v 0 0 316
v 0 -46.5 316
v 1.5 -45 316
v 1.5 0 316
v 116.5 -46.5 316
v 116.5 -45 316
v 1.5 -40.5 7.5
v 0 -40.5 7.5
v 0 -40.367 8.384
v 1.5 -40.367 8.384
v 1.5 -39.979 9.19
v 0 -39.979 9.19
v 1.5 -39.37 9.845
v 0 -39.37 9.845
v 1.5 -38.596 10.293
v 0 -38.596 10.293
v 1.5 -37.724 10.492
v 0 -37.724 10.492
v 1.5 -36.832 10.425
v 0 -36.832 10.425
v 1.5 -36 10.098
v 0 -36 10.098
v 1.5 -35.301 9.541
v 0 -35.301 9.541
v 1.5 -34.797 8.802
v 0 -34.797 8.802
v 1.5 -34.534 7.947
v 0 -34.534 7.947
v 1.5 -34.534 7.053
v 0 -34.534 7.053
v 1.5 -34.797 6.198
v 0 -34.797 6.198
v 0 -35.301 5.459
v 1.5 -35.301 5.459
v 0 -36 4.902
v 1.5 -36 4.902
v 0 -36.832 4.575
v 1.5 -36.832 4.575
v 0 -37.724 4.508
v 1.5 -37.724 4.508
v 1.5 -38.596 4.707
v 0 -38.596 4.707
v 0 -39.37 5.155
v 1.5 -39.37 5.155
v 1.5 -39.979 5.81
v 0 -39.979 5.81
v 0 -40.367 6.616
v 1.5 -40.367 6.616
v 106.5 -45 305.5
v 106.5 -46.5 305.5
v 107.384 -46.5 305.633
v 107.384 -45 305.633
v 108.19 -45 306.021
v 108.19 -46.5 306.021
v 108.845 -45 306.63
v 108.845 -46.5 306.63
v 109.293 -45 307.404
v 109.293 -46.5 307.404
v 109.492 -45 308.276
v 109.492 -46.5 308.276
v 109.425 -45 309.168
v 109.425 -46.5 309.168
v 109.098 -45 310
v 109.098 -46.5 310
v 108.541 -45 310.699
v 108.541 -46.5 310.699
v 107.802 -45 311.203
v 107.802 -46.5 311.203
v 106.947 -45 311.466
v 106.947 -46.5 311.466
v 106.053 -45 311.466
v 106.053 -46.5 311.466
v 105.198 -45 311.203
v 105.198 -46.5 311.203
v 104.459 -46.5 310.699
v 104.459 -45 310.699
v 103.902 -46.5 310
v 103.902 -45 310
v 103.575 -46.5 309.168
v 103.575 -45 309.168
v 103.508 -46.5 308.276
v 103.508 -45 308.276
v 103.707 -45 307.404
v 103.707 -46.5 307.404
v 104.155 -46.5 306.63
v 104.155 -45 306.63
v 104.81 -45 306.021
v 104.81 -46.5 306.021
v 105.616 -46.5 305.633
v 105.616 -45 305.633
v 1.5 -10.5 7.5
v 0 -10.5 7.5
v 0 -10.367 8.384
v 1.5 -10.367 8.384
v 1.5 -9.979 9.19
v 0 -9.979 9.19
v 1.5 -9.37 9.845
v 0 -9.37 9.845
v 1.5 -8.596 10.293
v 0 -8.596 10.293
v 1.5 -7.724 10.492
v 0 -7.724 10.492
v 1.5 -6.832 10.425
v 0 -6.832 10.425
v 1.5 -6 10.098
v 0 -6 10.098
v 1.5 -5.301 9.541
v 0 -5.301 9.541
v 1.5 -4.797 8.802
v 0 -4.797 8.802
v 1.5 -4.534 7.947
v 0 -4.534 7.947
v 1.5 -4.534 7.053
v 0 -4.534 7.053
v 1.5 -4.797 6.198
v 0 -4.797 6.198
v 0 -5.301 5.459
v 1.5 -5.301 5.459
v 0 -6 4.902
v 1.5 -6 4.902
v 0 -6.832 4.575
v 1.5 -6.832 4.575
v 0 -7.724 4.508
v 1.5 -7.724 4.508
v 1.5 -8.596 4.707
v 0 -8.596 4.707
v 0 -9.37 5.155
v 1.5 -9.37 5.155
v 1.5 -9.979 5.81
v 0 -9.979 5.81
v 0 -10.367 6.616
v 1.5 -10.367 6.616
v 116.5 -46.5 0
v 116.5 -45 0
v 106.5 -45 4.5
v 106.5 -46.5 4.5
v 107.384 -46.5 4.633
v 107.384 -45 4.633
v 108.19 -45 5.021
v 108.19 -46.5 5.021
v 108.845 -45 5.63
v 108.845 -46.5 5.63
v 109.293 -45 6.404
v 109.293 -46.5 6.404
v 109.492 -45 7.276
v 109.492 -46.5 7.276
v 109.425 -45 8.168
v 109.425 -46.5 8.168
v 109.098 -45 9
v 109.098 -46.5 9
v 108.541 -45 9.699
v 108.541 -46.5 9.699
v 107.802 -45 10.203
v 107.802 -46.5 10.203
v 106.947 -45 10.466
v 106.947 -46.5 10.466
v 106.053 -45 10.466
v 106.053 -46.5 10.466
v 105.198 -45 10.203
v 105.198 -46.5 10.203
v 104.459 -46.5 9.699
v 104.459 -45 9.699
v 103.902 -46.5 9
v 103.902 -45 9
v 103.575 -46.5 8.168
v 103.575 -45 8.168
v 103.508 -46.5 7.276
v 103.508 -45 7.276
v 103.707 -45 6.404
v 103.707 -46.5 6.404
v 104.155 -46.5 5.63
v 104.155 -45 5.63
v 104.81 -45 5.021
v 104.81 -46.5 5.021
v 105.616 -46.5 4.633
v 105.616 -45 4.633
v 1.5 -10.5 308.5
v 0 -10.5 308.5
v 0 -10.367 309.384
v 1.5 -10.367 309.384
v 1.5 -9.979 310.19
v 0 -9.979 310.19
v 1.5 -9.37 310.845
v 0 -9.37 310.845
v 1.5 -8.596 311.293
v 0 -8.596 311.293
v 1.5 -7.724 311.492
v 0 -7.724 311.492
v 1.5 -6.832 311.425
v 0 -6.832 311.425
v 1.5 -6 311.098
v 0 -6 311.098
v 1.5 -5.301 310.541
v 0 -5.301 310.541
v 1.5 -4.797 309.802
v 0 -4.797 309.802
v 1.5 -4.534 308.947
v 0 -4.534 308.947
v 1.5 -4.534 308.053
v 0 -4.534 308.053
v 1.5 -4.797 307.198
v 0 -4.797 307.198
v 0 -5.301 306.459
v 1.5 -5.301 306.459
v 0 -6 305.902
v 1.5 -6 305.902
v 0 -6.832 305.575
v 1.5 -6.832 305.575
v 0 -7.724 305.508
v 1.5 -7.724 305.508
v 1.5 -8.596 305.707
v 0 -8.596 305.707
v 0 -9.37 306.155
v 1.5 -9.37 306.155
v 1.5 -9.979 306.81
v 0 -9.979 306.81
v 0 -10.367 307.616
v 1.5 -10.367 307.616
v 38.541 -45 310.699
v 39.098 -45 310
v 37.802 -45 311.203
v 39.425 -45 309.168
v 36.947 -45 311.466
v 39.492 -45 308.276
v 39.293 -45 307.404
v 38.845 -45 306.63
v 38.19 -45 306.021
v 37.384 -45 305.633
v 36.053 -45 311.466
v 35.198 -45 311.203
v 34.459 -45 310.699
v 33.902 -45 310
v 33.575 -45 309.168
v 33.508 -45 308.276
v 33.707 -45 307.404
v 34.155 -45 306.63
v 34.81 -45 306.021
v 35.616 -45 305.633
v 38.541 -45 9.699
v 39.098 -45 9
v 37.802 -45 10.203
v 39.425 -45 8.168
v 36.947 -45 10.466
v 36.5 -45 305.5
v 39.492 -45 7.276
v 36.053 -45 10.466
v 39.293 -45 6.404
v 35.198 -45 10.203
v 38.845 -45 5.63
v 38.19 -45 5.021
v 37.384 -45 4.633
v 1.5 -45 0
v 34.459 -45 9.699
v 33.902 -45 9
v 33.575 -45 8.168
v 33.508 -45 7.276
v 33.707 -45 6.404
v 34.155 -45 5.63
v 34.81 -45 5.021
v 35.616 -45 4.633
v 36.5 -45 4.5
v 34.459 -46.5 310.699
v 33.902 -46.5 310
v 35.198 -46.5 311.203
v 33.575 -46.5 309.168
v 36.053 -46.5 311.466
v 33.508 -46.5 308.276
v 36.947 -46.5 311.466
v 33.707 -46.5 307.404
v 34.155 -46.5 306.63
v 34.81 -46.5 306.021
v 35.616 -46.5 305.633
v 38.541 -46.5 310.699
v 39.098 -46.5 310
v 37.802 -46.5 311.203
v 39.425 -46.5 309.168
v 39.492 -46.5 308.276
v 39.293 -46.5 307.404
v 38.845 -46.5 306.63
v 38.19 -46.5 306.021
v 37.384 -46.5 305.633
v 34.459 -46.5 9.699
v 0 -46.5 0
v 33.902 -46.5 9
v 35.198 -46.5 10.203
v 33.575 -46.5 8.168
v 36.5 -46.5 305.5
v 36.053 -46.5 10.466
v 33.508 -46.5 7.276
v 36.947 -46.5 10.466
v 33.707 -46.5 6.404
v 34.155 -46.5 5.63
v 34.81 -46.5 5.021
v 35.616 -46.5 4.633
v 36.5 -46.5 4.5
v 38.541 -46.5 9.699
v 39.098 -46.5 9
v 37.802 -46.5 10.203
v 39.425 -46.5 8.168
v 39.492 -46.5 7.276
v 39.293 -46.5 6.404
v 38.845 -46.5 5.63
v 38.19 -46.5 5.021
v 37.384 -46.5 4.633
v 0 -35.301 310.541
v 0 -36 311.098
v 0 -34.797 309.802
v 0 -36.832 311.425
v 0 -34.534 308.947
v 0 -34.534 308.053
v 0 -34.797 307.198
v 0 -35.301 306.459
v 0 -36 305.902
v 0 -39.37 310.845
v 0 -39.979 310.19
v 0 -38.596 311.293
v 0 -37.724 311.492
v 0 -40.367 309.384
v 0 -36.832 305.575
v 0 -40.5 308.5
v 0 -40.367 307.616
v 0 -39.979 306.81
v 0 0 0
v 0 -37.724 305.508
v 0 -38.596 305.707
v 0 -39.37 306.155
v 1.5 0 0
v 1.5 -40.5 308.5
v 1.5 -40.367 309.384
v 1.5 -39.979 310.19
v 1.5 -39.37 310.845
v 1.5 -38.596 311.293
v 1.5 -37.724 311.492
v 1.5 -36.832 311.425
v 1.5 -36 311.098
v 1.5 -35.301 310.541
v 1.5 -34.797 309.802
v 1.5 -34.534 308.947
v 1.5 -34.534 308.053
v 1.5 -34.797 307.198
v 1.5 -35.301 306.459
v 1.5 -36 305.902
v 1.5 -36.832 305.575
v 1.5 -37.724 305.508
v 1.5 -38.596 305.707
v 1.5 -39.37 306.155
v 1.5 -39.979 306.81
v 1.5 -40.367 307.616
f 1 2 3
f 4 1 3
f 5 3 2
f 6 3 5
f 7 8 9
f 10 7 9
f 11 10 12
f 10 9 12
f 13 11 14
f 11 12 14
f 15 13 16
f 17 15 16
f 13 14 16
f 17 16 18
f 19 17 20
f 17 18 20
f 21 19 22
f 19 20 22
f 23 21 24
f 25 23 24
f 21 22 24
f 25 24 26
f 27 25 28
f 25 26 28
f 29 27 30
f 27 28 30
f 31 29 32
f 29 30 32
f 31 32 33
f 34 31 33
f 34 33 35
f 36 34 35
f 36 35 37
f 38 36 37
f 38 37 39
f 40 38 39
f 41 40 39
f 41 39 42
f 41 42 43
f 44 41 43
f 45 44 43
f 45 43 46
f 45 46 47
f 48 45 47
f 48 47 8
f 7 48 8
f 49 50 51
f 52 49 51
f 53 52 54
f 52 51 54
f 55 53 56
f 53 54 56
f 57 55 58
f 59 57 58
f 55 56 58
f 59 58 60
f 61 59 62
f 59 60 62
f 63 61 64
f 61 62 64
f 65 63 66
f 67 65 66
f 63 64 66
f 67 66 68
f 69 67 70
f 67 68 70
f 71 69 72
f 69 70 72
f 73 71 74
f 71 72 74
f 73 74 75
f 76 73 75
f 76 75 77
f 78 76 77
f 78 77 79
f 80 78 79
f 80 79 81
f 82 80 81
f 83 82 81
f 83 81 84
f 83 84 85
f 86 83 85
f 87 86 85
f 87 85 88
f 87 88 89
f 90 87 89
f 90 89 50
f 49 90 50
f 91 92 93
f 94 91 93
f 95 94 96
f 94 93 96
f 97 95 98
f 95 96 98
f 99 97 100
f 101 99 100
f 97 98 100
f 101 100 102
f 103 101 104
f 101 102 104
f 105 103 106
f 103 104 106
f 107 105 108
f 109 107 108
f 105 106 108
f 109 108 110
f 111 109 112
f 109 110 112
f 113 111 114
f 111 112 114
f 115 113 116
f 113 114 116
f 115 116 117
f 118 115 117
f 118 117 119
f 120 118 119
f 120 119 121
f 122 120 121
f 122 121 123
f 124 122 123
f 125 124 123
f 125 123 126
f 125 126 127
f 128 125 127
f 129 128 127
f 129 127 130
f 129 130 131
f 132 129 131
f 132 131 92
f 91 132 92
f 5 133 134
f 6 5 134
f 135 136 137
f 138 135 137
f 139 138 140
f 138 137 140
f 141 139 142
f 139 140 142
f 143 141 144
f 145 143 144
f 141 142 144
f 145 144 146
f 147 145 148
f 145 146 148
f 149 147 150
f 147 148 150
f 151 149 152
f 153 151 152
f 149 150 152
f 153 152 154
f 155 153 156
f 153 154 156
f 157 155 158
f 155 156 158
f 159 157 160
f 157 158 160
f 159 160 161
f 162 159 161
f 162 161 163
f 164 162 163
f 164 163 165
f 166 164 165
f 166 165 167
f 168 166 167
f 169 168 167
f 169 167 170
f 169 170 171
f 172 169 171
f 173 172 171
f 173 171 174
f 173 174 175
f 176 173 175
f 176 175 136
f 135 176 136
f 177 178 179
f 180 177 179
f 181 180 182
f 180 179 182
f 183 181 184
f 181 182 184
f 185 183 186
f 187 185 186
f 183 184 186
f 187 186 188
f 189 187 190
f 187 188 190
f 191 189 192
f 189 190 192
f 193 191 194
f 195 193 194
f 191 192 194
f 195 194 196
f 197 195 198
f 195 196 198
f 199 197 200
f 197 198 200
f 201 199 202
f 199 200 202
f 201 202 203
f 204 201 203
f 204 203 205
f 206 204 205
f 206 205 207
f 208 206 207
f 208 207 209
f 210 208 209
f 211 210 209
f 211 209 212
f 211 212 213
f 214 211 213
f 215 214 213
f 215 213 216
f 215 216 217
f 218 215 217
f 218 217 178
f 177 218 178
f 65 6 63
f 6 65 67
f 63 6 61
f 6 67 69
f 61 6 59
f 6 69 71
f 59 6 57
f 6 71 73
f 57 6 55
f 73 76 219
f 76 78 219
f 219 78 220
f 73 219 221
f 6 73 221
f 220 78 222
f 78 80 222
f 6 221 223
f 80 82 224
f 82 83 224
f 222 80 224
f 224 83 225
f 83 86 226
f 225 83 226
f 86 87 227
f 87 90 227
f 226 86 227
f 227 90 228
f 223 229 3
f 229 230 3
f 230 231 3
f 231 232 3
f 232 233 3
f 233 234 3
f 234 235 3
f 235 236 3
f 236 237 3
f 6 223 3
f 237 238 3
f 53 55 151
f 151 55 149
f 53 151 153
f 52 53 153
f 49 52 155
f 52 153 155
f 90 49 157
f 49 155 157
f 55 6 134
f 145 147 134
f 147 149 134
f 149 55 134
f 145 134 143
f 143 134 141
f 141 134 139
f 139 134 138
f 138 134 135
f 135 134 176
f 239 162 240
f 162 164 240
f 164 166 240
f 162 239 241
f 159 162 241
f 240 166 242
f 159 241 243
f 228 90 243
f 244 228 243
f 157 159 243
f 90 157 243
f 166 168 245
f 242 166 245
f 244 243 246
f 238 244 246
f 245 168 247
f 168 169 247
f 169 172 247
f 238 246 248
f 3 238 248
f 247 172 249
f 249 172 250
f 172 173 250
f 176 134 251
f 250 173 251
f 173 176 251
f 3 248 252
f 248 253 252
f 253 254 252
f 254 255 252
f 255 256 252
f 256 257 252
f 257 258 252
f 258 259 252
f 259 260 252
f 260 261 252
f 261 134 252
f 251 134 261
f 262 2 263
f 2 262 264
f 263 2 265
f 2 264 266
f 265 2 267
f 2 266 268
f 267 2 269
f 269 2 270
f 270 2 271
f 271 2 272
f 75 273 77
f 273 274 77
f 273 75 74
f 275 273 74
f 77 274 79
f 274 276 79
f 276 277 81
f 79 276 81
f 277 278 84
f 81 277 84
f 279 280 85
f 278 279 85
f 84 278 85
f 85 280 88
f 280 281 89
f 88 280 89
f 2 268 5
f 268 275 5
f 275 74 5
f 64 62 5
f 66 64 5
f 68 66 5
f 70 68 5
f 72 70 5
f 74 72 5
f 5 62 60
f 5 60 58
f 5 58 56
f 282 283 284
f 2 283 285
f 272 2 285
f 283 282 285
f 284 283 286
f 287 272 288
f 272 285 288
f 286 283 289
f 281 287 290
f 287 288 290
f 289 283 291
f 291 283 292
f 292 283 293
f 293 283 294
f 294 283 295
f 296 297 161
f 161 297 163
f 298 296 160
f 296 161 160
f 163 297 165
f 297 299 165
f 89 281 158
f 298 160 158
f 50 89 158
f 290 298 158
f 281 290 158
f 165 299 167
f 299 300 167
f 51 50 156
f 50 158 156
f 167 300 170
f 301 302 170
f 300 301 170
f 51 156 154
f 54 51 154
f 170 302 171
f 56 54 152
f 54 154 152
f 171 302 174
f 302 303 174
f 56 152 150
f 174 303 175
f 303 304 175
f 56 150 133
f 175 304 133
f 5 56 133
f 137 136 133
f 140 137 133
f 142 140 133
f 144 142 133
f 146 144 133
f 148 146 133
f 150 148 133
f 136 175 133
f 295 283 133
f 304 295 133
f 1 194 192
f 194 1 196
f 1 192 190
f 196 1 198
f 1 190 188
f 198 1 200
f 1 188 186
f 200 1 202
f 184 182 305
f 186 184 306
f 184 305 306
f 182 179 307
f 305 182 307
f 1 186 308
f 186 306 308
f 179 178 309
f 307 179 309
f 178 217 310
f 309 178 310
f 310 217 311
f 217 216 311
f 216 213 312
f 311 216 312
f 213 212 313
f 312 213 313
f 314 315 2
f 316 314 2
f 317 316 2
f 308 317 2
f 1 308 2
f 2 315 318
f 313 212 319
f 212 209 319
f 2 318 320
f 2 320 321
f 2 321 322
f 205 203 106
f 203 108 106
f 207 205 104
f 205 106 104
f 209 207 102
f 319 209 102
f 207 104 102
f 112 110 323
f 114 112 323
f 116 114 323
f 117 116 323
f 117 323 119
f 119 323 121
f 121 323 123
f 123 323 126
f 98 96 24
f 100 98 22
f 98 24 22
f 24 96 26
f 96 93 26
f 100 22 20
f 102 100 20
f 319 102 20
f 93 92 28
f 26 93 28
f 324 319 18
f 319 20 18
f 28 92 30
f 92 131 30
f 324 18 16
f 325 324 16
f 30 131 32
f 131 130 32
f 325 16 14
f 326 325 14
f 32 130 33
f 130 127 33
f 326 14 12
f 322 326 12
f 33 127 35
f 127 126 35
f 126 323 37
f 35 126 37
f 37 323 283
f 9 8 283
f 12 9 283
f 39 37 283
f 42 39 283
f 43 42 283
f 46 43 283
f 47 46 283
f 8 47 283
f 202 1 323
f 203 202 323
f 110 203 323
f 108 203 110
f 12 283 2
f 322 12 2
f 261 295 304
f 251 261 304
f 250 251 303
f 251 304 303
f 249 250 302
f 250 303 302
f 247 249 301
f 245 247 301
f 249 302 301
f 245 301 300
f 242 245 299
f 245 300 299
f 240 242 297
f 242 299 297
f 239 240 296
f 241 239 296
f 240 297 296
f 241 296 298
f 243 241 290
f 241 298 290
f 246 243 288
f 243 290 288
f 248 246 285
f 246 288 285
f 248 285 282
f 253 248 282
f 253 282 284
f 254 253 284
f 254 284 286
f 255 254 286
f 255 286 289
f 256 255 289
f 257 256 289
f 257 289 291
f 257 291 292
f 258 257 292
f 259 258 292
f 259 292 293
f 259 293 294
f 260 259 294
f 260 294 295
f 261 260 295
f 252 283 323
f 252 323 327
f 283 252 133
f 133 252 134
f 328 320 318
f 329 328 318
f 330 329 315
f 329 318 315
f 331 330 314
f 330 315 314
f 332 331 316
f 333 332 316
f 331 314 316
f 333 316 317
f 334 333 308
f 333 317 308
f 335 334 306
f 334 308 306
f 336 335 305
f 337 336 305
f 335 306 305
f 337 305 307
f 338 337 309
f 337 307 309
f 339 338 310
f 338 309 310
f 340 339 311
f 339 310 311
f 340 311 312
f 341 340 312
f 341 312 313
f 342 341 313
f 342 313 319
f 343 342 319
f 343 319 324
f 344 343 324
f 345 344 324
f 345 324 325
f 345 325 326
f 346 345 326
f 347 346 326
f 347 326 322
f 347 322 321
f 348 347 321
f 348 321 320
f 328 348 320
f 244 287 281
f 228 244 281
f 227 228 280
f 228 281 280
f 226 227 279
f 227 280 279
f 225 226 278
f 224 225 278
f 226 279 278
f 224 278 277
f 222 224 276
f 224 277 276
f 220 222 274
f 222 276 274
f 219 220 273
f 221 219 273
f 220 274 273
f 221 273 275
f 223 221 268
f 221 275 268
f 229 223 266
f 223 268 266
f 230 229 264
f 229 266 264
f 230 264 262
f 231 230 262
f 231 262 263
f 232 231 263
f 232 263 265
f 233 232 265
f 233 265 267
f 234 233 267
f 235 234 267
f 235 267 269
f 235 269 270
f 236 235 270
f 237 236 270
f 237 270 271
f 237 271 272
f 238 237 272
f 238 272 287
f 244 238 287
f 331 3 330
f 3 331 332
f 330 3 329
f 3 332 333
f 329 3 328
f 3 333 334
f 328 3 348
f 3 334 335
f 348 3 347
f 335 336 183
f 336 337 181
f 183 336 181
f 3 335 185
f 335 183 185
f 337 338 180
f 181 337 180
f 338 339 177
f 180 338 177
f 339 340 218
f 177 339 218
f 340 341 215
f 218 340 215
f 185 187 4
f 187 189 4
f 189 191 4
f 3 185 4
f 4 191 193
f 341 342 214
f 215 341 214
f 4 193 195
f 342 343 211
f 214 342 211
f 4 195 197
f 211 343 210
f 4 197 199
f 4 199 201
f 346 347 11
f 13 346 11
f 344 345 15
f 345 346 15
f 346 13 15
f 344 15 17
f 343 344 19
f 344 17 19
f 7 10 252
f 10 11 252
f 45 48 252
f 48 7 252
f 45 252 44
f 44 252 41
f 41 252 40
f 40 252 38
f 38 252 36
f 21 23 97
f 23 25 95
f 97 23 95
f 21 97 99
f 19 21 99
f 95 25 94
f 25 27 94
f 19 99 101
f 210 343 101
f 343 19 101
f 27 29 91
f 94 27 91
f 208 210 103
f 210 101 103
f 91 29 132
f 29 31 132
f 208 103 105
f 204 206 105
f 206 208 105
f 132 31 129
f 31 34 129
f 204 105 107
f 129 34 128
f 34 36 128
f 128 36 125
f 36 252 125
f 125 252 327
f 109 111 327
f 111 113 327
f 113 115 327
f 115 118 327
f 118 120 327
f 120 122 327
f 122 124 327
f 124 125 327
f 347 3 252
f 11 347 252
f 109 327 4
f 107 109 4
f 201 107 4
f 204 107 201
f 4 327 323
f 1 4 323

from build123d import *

# Parameters (mm, degrees)
BOSS_EXTRUDE1_DEPTH = 316
CUT_EXTRUDE1_REACH  = 341.986
SKETCH2_R           = 3
CUT_EXTRUDE2_REACH  = 341.986
SKETCH3_R           = 3


with BuildPart() as part:
    # Sketch1 → Boss-Extrude1 (new body)
    with BuildSketch(Plane.XY):
        Polygon((0, 0), (0, -46.5), (116.5, -46.5), (116.5, -45), (1.5, -45), (1.5, 0), align=None)
    extrude(amount=BOSS_EXTRUDE1_DEPTH)

    # Sketch2 → Cut-Extrude1 (cut, up to next)
    with BuildSketch(Plane.ZY, mode=Mode.PRIVATE) as cut_extrude1_sk1:
        with Locations(Location((7.5, -7.5, 0), (0, 0, 270))):
            Circle(SKETCH2_R)
    cut_extrude1_tool1 = extrude(cut_extrude1_sk1.sketch, amount=-CUT_EXTRUDE1_REACH, mode=Mode.PRIVATE) & part.part
    # Sketch2 → Cut-Extrude1 (cut, up to next)
    with BuildSketch(Plane.ZY, mode=Mode.PRIVATE) as cut_extrude1_sk2:
        with Locations(Location((7.5, -37.5, 0), (0, 0, 270))):
            Circle(SKETCH2_R)
    cut_extrude1_tool2 = extrude(cut_extrude1_sk2.sketch, amount=-CUT_EXTRUDE1_REACH, mode=Mode.PRIVATE) & part.part
    # Sketch2 → Cut-Extrude1 (cut, up to next)
    with BuildSketch(Plane.ZY, mode=Mode.PRIVATE) as cut_extrude1_sk3:
        with Locations(Location((308.5, -37.5, 0), (0, 0, 270))):
            Circle(SKETCH2_R)
    cut_extrude1_tool3 = extrude(cut_extrude1_sk3.sketch, amount=-CUT_EXTRUDE1_REACH, mode=Mode.PRIVATE) & part.part
    # Sketch2 → Cut-Extrude1 (cut, up to next)
    with BuildSketch(Plane.ZY, mode=Mode.PRIVATE) as cut_extrude1_sk4:
        with Locations(Location((308.5, -7.5, 0), (0, 0, 270))):
            Circle(SKETCH2_R)
    cut_extrude1_tool4 = extrude(cut_extrude1_sk4.sketch, amount=-CUT_EXTRUDE1_REACH, mode=Mode.PRIVATE) & part.part
    add(cut_extrude1_tool1.solids().sort_by_distance((0, -7.5, 7.5))[0], mode=Mode.SUBTRACT)
    add(cut_extrude1_tool2.solids().sort_by_distance((0, -37.5, 7.5))[0], mode=Mode.SUBTRACT)
    add(cut_extrude1_tool3.solids().sort_by_distance((0, -37.5, 308.5))[0], mode=Mode.SUBTRACT)
    add(cut_extrude1_tool4.solids().sort_by_distance((0, -7.5, 308.5))[0], mode=Mode.SUBTRACT)

    # Sketch3 → Cut-Extrude2 (cut, up to next)
    with BuildSketch(Plane.XZ.offset(46.5), mode=Mode.PRIVATE) as cut_extrude2_sk1:
        with Locations(Location((106.5, 308.5, 0), (0, 0, 270))):
            Circle(SKETCH3_R)
    cut_extrude2_tool1 = extrude(cut_extrude2_sk1.sketch, amount=-CUT_EXTRUDE2_REACH, mode=Mode.PRIVATE) & part.part
    # Sketch3 → Cut-Extrude2 (cut, up to next)
    with BuildSketch(Plane.XZ.offset(46.5), mode=Mode.PRIVATE) as cut_extrude2_sk2:
        with Locations(Location((36.5, 308.5, 0), (0, 0, 270))):
            Circle(SKETCH3_R)
    cut_extrude2_tool2 = extrude(cut_extrude2_sk2.sketch, amount=-CUT_EXTRUDE2_REACH, mode=Mode.PRIVATE) & part.part
    # Sketch3 → Cut-Extrude2 (cut, up to next)
    with BuildSketch(Plane.XZ.offset(46.5), mode=Mode.PRIVATE) as cut_extrude2_sk3:
        with Locations(Location((106.5, 7.5, 0), (0, 0, 270))):
            Circle(SKETCH3_R)
    cut_extrude2_tool3 = extrude(cut_extrude2_sk3.sketch, amount=-CUT_EXTRUDE2_REACH, mode=Mode.PRIVATE) & part.part
    # Sketch3 → Cut-Extrude2 (cut, up to next)
    with BuildSketch(Plane.XZ.offset(46.5), mode=Mode.PRIVATE) as cut_extrude2_sk4:
        with Locations(Location((36.5, 7.5, 0), (0, 0, 270))):
            Circle(SKETCH3_R)
    cut_extrude2_tool4 = extrude(cut_extrude2_sk4.sketch, amount=-CUT_EXTRUDE2_REACH, mode=Mode.PRIVATE) & part.part
    add(cut_extrude2_tool1.solids().sort_by_distance((106.5, -46.5, 308.5))[0], mode=Mode.SUBTRACT)
    add(cut_extrude2_tool2.solids().sort_by_distance((36.5, -46.5, 308.5))[0], mode=Mode.SUBTRACT)
    add(cut_extrude2_tool3.solids().sort_by_distance((106.5, -46.5, 7.5))[0], mode=Mode.SUBTRACT)
    add(cut_extrude2_tool4.solids().sort_by_distance((36.5, -46.5, 7.5))[0], mode=Mode.SUBTRACT)


solid = part.part
